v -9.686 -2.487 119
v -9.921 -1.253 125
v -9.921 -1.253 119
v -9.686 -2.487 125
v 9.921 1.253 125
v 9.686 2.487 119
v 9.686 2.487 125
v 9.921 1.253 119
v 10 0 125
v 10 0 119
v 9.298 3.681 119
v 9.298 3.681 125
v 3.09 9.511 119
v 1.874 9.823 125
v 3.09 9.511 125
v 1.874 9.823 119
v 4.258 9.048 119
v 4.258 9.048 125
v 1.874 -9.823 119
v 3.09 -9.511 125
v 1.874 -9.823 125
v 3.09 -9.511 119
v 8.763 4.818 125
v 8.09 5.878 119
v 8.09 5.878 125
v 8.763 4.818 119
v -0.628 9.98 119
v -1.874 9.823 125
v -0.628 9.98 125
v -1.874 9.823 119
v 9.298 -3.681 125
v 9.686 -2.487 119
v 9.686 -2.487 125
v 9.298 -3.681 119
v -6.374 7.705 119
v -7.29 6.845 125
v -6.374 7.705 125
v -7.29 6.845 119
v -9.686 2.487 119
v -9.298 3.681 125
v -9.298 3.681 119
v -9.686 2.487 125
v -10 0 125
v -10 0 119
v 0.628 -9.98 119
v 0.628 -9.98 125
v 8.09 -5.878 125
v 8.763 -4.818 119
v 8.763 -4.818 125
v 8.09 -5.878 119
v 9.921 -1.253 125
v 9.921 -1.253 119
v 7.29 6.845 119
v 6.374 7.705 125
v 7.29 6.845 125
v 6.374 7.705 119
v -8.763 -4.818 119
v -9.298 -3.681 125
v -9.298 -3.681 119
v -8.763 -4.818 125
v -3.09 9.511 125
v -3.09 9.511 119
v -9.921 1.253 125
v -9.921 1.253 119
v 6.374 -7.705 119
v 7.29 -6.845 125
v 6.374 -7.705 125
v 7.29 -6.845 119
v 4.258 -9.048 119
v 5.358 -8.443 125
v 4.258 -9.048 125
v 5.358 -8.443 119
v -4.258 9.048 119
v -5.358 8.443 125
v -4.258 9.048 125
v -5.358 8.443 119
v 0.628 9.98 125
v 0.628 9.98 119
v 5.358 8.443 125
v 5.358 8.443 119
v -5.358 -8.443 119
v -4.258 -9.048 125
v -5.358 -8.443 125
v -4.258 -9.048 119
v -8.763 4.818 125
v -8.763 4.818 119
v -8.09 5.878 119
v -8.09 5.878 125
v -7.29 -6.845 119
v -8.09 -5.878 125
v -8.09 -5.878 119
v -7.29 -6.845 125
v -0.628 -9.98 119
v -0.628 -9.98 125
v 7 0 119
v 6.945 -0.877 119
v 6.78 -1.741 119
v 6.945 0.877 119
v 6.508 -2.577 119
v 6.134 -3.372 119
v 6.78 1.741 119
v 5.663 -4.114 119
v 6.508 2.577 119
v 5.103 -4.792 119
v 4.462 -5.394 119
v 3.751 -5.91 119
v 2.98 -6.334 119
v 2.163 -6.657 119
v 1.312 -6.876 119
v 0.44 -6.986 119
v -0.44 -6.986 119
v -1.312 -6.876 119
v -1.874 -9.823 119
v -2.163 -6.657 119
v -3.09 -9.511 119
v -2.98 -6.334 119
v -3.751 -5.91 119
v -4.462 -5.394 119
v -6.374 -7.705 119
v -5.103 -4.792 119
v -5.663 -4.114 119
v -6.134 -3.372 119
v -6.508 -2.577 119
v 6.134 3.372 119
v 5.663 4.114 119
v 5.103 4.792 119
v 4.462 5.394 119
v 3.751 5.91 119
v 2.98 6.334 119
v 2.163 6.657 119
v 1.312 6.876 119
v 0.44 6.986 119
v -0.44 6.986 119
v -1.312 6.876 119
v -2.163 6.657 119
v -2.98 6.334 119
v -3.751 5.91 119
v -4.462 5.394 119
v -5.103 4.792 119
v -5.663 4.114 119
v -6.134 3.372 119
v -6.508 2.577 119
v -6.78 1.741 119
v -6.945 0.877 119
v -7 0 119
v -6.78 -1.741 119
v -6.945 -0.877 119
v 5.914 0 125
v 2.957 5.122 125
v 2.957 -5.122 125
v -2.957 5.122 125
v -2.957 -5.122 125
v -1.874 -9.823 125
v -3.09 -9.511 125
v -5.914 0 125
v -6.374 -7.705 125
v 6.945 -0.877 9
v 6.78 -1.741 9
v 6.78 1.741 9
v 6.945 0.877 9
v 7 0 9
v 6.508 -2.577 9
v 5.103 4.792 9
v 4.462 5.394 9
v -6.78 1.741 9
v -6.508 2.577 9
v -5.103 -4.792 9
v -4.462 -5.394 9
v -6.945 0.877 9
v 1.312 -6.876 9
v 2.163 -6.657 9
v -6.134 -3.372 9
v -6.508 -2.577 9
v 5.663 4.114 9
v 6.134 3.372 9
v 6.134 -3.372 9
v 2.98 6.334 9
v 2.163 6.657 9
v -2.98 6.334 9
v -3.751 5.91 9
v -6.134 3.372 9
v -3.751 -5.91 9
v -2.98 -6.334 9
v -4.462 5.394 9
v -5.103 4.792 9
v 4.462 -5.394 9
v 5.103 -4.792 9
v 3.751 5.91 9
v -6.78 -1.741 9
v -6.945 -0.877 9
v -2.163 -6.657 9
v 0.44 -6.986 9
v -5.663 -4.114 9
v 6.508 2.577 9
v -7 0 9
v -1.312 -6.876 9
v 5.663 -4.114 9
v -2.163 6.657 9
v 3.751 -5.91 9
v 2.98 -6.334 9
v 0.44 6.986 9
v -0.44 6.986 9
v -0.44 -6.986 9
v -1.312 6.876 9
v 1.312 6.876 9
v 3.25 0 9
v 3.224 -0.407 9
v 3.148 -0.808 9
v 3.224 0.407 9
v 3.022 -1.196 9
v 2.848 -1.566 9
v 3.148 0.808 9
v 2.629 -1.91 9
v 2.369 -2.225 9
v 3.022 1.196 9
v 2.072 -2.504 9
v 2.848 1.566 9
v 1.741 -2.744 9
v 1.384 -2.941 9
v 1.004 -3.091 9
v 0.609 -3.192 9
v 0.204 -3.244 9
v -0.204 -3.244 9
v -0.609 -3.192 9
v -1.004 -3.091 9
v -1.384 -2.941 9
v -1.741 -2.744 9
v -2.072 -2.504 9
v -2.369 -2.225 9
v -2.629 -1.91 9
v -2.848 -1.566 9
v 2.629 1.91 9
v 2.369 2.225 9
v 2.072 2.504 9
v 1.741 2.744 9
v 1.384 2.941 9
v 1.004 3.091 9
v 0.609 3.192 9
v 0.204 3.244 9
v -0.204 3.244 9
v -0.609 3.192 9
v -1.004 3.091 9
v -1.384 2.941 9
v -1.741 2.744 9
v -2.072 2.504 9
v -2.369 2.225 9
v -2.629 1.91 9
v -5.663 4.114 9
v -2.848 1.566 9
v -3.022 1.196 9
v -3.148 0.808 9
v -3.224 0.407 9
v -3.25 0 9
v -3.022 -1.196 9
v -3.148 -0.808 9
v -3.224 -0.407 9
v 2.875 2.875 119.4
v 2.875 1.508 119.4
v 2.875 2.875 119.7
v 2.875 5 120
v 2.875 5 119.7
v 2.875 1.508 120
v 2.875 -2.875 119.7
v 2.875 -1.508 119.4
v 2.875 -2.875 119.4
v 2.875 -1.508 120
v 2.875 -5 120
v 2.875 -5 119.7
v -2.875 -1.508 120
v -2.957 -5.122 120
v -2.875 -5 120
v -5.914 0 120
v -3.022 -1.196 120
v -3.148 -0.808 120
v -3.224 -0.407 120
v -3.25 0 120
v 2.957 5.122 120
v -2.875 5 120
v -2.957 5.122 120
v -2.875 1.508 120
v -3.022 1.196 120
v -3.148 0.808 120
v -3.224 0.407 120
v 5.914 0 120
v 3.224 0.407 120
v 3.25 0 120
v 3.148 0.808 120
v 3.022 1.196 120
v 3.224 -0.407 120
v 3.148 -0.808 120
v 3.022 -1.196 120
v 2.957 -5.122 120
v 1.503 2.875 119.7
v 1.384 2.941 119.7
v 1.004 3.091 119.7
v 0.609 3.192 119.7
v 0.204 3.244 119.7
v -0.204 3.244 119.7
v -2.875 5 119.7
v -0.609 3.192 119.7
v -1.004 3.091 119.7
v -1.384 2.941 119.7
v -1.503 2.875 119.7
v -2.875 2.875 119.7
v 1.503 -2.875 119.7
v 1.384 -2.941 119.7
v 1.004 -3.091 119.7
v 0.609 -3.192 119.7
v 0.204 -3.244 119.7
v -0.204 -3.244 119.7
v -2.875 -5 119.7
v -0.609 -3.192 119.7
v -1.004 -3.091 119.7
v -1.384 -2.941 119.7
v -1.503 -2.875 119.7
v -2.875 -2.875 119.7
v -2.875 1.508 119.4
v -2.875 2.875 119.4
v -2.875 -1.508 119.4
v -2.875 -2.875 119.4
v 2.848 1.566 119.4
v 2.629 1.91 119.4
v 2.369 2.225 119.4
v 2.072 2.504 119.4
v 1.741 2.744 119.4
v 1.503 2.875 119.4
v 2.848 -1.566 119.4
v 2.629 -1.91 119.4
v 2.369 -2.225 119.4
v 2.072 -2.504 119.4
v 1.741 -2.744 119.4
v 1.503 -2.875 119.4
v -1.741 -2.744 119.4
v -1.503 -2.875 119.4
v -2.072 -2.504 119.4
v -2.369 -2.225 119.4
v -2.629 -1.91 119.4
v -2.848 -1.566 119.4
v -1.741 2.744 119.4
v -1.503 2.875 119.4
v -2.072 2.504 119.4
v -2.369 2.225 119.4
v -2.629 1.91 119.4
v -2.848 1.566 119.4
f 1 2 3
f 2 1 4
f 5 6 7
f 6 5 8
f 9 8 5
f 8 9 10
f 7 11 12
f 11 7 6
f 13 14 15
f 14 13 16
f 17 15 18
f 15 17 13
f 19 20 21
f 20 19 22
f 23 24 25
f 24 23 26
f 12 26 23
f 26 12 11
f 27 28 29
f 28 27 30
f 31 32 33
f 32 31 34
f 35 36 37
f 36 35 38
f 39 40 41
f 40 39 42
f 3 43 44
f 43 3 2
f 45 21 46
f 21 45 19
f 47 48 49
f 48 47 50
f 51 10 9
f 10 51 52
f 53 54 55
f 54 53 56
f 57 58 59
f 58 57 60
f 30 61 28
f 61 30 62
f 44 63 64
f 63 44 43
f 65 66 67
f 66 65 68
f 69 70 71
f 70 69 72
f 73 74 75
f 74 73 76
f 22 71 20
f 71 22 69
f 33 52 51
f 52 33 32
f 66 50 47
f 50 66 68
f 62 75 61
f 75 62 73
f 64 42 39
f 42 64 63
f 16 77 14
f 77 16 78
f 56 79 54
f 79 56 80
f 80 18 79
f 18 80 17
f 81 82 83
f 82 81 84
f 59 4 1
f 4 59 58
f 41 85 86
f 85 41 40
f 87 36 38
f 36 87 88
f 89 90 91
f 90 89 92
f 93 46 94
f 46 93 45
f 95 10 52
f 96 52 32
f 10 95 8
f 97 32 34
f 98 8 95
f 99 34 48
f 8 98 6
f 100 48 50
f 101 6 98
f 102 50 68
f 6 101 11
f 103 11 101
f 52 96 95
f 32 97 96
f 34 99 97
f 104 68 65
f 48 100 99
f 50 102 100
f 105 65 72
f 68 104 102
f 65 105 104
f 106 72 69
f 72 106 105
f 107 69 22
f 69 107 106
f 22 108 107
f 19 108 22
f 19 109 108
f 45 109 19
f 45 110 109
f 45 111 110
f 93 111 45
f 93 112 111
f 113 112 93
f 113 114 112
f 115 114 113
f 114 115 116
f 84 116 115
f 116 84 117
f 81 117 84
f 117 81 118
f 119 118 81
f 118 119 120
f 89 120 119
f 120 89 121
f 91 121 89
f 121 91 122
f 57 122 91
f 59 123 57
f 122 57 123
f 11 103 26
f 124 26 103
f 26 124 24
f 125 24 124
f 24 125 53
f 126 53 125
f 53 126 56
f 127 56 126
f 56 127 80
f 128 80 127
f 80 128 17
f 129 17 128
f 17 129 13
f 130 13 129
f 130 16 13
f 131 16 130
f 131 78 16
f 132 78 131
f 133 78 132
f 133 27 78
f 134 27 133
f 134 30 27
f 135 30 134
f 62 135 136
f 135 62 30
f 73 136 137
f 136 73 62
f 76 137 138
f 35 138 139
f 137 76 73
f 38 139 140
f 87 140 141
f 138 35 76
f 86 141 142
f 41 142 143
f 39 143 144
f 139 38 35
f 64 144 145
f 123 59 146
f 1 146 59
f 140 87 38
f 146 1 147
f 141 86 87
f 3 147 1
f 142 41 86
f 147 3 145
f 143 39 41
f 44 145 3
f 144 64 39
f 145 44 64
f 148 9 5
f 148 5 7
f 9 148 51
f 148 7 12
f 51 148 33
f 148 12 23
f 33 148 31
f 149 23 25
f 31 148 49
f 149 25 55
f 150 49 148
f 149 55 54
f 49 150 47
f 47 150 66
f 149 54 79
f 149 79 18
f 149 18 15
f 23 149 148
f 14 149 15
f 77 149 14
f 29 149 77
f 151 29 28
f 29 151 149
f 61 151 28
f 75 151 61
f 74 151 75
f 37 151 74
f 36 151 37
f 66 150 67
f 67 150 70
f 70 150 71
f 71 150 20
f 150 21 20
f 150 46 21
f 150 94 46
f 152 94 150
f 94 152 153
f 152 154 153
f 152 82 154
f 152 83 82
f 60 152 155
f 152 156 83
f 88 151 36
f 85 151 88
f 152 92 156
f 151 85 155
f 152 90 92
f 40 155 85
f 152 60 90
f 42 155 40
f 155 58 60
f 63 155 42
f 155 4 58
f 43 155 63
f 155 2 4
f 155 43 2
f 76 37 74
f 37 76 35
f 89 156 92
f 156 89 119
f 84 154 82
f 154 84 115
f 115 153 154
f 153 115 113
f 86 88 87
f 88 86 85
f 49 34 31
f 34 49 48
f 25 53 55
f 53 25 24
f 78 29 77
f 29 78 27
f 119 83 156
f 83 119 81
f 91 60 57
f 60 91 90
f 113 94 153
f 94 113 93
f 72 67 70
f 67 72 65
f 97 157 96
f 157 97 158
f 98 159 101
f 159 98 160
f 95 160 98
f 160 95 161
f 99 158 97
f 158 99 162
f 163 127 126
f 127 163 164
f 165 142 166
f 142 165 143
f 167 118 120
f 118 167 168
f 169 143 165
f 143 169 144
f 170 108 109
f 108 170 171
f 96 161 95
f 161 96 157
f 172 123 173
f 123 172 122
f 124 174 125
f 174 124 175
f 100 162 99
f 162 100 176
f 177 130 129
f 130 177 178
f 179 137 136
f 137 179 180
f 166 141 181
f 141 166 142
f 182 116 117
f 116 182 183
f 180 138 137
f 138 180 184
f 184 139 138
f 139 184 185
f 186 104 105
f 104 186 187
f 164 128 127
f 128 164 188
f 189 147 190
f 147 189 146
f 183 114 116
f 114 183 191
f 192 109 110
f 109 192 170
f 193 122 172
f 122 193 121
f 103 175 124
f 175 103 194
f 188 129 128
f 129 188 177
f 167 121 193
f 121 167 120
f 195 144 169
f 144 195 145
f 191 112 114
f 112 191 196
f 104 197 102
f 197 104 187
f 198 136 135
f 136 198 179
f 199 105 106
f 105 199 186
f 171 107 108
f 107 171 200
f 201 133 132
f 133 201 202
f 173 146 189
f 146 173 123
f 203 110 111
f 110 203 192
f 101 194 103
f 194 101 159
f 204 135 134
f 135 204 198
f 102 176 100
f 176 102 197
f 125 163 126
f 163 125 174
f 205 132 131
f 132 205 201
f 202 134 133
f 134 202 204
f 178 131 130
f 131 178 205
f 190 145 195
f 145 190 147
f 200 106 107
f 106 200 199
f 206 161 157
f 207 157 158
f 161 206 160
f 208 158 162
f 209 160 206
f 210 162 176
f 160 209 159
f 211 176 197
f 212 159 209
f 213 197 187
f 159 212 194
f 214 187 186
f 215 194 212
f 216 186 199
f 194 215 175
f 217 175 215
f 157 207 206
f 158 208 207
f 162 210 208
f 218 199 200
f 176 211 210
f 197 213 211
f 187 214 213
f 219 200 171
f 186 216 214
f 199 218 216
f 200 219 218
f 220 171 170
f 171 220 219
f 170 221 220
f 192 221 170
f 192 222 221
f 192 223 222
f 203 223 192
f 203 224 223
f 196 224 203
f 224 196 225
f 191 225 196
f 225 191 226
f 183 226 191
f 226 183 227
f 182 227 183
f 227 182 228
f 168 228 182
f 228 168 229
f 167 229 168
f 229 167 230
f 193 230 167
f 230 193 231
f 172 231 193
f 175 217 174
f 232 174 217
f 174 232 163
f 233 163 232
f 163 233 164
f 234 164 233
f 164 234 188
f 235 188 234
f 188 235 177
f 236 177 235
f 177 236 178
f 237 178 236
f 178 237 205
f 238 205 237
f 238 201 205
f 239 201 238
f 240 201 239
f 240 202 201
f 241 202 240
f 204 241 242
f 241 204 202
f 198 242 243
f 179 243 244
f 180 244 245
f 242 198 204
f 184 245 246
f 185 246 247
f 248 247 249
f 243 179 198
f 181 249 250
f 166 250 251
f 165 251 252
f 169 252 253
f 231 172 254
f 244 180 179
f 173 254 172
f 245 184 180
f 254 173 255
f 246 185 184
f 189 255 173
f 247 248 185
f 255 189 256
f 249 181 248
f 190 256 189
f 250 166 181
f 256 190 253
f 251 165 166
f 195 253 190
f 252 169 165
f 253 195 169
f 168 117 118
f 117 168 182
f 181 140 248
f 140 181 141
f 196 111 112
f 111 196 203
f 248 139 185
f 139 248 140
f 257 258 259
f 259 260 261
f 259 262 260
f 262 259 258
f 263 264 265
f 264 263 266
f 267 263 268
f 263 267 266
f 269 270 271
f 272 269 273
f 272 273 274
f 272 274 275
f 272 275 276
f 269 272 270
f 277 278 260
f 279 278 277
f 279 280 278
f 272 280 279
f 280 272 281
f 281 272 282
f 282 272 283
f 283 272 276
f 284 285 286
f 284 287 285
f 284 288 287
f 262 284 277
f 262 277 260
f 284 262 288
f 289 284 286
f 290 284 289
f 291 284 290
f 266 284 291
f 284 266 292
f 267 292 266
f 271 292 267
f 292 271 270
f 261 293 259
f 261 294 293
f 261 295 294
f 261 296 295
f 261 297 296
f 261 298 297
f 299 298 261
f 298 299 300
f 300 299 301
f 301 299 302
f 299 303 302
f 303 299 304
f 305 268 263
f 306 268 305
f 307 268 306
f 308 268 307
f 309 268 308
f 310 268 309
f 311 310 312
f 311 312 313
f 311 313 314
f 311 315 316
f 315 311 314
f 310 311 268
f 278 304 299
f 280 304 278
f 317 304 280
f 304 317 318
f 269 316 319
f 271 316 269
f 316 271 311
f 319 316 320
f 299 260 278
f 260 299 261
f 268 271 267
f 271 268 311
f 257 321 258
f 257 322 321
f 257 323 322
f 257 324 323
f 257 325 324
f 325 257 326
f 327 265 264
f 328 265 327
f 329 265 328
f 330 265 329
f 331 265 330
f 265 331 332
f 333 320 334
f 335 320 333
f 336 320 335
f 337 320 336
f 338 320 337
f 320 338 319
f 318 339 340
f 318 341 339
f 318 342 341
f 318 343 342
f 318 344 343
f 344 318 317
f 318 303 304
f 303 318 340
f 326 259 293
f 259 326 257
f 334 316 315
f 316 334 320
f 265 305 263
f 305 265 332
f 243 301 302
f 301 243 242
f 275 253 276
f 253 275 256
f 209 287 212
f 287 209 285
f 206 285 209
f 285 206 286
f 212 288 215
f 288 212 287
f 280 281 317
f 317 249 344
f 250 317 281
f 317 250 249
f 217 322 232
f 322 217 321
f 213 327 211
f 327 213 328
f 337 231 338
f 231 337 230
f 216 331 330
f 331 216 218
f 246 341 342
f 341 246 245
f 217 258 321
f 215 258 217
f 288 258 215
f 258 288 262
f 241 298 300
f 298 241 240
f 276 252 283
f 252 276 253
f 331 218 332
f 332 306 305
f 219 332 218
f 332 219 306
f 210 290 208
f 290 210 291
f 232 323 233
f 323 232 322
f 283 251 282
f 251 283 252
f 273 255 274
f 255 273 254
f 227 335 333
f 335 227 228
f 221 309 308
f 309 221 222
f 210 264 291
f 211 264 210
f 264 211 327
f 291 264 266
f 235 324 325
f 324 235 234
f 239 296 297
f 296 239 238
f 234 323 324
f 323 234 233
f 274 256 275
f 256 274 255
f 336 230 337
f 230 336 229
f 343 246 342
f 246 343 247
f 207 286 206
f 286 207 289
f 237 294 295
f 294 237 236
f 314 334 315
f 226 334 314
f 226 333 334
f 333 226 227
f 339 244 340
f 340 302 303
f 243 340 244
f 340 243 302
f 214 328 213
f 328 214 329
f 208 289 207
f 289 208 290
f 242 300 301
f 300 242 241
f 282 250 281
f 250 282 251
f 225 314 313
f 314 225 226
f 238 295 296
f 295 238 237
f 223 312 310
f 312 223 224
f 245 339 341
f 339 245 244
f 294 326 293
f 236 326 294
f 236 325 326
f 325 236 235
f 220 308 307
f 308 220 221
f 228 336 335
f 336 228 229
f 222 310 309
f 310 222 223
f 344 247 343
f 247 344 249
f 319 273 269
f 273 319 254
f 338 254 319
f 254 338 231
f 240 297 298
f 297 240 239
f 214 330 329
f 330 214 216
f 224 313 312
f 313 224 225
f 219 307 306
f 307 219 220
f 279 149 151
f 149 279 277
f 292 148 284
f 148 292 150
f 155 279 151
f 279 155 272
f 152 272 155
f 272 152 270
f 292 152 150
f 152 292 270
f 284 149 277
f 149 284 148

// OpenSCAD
$fn = 50;


difference() {
	union() {
		translate(v = [0, 0, 119.0000000000]) {
			cylinder(h = 6, r = 10.0000000000);
		}
		translate(v = [0, 0, 9.0000000000]) {
			cylinder(h = 116, r = 7.0000000000);
		}
	}
	union() {
		translate(v = [0, 0, 125]) {
			rotate(a = [0, 0, 0]) {
				difference() {
					union() {
						#translate(v = [-2.8750000000, -5.0000000000, -5.3000000000]) {
							cube(size = [5.7500000000, 10, 0.3000000000]);
						}
						#translate(v = [-2.8750000000, -2.8750000000, -5.6000000000]) {
							cube(size = [5.7500000000, 5.7500000000, 0.3000000000]);
						}
						#translate(v = [-2.8750000000, -5.0000000000, 0]) {
							cube(size = [5.7500000000, 10, 0.3000000000]);
						}
						#translate(v = [-2.8750000000, -2.8750000000, 0.3000000000]) {
							cube(size = [5.7500000000, 5.7500000000, 0.3000000000]);
						}
						#translate(v = [0, 0, -100.0000000000]) {
							cylinder(h = 200, r = 3.2500000000);
						}
						translate(v = [0, 0, -5]) {
							#linear_extrude(height = 5) {
								polygon(points = [[5.9142500000, 0.0000000000], [2.9571250000, 5.1218907443], [-2.9571250000, 5.1218907443], [-5.9142500000, 0.0000000000], [-2.9571250000, -5.1218907443], [2.9571250000, -5.1218907443]]);
							}
						}
						#translate(v = [-2.8750000000, -5.0000000000, -5.3000000000]) {
							cube(size = [5.7500000000, 10, 0.3000000000]);
						}
						#translate(v = [-2.8750000000, -2.8750000000, -5.6000000000]) {
							cube(size = [5.7500000000, 5.7500000000, 0.3000000000]);
						}
						#translate(v = [-2.8750000000, -5.0000000000, 0]) {
							cube(size = [5.7500000000, 10, 0.3000000000]);
						}
						#translate(v = [-2.8750000000, -2.8750000000, 0.3000000000]) {
							cube(size = [5.7500000000, 5.7500000000, 0.3000000000]);
						}
						#translate(v = [0, 0, -100.0000000000]) {
							cylinder(h = 200, r = 3.2500000000);
						}
						#translate(v = [-2.8750000000, -5.0000000000, -5.3000000000]) {
							cube(size = [5.7500000000, 10, 0.3000000000]);
						}
						#translate(v = [-2.8750000000, -2.8750000000, -5.6000000000]) {
							cube(size = [5.7500000000, 5.7500000000, 0.3000000000]);
						}
						#translate(v = [-2.8750000000, -5.0000000000, 0]) {
							cube(size = [5.7500000000, 10, 0.3000000000]);
						}
						#translate(v = [-2.8750000000, -2.8750000000, 0.3000000000]) {
							cube(size = [5.7500000000, 5.7500000000, 0.3000000000]);
						}
						#translate(v = [0, 0, -100.0000000000]) {
							cylinder(h = 200, r = 3.2500000000);
						}
					}
					union();
				}
			}
		}
		#translate(v = [0, 0, -100.0000000000]) {
			cylinder(h = 200, r = 3.2500000000);
		}
	}
}
